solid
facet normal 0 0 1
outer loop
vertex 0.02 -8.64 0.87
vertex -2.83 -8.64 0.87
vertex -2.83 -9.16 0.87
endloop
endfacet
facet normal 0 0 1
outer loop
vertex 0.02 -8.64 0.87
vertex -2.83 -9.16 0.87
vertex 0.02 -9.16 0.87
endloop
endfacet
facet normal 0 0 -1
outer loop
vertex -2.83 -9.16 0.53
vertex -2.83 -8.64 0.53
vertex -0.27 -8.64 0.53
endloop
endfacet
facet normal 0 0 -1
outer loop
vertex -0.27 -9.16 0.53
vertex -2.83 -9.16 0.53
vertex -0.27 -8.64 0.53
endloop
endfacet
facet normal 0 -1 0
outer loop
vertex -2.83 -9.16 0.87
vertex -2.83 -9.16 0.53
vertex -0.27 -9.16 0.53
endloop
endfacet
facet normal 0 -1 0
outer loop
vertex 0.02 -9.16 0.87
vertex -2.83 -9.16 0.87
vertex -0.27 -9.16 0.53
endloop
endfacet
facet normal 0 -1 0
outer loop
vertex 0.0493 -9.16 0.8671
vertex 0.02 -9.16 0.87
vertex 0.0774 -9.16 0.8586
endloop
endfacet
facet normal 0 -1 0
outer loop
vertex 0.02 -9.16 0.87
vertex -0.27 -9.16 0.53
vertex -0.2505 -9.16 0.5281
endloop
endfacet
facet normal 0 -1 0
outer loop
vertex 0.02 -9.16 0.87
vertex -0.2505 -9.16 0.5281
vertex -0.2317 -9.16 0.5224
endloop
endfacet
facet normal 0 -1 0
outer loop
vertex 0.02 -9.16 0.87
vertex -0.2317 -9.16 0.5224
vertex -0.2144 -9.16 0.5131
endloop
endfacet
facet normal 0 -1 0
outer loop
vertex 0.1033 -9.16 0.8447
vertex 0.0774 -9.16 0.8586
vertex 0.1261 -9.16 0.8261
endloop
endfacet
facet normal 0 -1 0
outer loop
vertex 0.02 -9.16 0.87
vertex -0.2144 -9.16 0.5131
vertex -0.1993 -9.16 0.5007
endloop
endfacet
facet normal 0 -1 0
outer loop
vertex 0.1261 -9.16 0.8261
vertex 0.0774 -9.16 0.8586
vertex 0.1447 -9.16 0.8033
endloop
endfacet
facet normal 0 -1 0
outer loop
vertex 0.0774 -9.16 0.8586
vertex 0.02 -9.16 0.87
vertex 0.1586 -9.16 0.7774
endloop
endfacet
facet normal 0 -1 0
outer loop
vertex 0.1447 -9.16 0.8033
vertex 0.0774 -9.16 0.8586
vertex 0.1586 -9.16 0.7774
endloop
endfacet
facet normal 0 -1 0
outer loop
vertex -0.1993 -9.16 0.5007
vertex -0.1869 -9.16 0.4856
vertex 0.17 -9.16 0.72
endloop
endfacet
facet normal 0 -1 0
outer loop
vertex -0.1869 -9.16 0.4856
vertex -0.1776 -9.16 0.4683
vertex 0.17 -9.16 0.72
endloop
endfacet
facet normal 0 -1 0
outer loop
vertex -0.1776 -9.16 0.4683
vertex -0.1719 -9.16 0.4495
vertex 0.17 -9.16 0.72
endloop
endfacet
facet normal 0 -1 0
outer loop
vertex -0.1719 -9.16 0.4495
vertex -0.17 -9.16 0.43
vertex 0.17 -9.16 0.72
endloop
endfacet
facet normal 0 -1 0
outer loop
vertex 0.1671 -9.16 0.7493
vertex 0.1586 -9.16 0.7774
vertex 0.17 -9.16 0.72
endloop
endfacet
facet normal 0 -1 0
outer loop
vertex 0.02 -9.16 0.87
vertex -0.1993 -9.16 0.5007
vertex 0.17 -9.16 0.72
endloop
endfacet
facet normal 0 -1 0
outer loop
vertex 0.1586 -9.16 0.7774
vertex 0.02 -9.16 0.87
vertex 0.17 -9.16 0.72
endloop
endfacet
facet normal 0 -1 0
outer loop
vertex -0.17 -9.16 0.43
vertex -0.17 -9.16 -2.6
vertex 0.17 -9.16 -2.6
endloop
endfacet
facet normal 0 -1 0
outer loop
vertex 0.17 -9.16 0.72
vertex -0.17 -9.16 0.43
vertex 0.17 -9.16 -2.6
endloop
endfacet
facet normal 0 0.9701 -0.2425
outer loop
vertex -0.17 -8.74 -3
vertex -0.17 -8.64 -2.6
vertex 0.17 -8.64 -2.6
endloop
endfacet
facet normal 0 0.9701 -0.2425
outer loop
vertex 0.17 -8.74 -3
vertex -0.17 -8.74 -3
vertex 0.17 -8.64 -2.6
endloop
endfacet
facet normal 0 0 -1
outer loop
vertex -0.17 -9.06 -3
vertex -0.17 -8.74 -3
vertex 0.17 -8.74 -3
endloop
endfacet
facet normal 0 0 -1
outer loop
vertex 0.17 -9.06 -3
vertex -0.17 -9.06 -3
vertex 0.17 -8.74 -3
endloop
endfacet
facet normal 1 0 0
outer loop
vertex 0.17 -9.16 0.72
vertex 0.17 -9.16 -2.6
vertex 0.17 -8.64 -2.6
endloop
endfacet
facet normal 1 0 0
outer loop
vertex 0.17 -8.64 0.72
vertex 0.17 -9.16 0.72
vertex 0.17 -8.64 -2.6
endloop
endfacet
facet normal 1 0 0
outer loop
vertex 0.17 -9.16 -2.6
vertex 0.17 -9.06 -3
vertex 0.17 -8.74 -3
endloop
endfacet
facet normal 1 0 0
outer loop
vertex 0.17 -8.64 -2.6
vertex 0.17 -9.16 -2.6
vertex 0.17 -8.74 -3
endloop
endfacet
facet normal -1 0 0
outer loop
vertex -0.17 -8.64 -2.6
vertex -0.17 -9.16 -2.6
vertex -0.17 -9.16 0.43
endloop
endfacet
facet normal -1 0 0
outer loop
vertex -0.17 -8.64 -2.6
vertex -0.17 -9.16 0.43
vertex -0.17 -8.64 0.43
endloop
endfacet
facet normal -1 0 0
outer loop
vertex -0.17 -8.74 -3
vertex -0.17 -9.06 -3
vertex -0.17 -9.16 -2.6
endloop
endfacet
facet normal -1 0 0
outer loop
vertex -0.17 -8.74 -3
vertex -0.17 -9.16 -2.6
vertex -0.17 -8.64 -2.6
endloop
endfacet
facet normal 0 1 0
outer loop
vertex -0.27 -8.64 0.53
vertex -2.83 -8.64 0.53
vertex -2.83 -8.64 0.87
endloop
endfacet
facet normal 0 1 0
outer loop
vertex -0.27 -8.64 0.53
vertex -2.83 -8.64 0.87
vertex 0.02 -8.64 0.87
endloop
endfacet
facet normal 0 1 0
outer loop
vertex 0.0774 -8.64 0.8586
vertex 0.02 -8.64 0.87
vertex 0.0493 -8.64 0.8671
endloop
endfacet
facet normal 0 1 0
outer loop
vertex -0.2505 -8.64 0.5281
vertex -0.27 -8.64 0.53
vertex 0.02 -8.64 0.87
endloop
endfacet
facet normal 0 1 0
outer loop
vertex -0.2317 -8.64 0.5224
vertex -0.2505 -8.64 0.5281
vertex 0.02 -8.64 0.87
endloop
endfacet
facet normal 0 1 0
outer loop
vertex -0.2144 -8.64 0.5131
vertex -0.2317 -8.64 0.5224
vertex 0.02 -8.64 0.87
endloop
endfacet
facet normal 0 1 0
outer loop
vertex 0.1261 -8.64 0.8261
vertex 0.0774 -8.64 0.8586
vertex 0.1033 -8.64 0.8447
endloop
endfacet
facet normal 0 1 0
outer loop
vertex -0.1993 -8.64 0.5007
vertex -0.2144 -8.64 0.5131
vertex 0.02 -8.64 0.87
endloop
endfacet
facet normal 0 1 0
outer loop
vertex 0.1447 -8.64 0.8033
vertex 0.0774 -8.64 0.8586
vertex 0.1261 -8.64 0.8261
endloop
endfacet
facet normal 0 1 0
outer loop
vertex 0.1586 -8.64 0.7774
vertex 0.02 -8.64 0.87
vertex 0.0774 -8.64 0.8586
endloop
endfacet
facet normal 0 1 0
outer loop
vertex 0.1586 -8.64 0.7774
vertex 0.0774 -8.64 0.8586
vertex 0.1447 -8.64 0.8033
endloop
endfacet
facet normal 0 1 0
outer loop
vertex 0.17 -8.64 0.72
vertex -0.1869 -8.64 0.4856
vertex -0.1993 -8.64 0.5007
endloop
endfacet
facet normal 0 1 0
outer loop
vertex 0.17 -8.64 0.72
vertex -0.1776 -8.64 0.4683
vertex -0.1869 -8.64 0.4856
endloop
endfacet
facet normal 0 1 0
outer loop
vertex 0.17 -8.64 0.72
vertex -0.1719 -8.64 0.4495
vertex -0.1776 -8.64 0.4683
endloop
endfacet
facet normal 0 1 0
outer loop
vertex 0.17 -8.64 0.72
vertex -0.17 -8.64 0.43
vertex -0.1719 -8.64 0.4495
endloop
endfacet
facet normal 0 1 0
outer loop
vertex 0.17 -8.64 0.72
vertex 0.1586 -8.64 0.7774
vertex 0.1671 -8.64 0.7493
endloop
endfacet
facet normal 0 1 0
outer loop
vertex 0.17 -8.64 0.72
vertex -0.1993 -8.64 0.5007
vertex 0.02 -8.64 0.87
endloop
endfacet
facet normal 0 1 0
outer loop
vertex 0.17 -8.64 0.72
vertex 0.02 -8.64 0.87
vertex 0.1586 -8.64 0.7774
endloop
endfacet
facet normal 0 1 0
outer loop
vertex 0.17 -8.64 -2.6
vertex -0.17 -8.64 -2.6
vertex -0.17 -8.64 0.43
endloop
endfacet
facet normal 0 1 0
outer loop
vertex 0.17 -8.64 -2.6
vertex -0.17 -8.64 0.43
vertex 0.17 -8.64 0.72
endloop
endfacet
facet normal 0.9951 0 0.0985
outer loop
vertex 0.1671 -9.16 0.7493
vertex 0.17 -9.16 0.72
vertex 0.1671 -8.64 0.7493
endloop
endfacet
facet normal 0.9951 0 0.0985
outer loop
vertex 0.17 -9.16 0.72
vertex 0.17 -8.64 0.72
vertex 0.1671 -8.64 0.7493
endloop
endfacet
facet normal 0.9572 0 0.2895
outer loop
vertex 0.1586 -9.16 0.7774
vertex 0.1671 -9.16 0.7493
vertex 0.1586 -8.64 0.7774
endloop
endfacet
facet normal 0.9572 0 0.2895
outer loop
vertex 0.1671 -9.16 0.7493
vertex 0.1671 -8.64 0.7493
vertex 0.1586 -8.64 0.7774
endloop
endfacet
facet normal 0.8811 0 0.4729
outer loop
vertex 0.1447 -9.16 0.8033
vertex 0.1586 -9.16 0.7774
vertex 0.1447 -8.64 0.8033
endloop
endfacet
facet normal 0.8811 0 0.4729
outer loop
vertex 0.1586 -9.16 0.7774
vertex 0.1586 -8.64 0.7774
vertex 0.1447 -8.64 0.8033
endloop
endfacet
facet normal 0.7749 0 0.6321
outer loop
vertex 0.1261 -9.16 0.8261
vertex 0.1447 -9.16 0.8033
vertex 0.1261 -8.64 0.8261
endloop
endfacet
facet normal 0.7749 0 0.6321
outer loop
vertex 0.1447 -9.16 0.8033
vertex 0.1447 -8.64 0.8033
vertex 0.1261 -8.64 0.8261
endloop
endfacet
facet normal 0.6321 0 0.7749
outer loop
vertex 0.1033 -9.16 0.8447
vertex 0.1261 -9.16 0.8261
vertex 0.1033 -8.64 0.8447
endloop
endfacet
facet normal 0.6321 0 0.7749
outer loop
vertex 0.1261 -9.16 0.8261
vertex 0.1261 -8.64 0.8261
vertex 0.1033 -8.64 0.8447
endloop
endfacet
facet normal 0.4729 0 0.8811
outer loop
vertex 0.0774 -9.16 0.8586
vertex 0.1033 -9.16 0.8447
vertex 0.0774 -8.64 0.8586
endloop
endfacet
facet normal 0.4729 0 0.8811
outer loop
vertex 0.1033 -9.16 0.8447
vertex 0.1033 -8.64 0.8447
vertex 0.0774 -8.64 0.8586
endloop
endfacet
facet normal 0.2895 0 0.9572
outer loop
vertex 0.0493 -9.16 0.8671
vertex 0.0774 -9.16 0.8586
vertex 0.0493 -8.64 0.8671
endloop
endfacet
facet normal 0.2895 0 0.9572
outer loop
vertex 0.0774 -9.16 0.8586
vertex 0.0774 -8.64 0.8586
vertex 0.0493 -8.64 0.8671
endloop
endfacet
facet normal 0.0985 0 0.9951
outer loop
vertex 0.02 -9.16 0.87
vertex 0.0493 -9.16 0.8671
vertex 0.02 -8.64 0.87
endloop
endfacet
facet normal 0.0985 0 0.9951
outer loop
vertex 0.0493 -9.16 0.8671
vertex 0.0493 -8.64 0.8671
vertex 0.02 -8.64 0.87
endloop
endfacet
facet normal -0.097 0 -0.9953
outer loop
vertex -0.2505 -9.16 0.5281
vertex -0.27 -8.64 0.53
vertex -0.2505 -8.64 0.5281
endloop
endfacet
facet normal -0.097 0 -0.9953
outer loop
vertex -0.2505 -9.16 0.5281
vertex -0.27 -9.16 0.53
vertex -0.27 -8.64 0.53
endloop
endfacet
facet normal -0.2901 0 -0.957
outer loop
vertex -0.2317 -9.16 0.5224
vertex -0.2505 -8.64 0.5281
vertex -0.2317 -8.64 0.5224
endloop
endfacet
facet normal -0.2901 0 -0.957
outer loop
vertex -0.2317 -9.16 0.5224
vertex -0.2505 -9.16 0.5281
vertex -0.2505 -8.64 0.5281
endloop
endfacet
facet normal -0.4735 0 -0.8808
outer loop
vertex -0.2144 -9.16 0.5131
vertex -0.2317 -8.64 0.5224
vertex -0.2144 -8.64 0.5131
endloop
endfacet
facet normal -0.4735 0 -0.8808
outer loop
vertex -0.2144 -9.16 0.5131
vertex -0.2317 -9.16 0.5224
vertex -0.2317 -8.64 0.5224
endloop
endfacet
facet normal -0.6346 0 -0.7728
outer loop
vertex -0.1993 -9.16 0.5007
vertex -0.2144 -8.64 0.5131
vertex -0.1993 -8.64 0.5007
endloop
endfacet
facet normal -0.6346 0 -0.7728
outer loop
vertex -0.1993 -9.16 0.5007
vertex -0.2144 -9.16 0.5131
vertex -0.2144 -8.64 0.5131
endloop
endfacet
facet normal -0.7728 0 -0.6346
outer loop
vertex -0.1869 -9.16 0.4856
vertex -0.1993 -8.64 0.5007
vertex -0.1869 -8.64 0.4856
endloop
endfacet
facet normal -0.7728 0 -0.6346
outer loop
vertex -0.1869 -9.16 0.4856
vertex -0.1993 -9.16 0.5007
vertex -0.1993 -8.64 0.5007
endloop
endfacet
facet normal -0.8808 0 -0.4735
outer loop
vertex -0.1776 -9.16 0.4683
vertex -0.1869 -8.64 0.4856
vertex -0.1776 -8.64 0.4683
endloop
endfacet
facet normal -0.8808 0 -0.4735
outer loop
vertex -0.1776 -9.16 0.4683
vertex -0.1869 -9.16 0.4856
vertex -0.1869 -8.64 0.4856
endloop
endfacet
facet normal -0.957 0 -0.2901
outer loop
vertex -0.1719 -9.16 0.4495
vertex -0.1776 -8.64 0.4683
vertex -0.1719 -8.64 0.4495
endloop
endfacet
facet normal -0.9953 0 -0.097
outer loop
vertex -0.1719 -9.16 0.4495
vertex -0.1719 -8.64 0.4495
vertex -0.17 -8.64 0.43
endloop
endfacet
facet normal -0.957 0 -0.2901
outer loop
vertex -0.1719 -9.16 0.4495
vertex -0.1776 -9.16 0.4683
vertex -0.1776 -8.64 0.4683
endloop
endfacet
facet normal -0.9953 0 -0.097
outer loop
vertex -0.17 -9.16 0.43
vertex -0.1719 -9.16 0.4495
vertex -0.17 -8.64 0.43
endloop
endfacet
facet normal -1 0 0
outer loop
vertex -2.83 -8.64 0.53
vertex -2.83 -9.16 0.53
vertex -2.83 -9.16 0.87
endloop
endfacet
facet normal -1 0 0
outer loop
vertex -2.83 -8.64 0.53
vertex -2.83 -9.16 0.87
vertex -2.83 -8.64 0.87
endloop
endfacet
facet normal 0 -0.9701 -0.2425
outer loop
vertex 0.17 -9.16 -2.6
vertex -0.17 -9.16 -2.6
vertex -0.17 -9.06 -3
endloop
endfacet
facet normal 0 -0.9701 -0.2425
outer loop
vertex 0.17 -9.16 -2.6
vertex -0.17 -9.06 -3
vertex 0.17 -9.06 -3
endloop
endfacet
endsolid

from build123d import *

# Parameters (mm, degrees)
BOX006_W         = 0.34
BOX006_H         = 0.52
BOX006_DEPTH     = 3.87
BOX007_W         = 3
BOX007_H         = 0.52
BOX007_DEPTH     = 0.34
FILLET007_R      = 0.15
FILLET008_R      = 0.1
CHAMFER016_SIZE2 = 0.4
CHAMFER016_SIZE  = 0.1
CHAMFER017_SIZE2 = 0.4
CHAMFER017_SIZE  = 0.1


with BuildPart() as kub006:
    # Box006 → Box006 (new body)
    with BuildSketch(Plane(origin=(-0.17, -0.26, -3), x_dir=(1, 0, 0), z_dir=(0, 0, 1))):
        with Locations((0.17, 0.26)):
            Rectangle(BOX006_W, BOX006_H)
    extrude(amount=BOX006_DEPTH)


with BuildPart() as chamfer017:
    # Box007 → Box007 (new body)
    with BuildSketch(Plane(origin=(-2.83, -0.26, 0.53), x_dir=(1, 0, 0), z_dir=(0, 0, 1))):
        with Locations((1.5, 0.26)):
            Rectangle(BOX007_W, BOX007_H)
    extrude(amount=BOX007_DEPTH)

    # Fusion004: union Kub006
    add(kub006.part)

    # Fillet007
    fillet007_edges = [chamfer017.edges().sort_by_distance(p)[0] for p in [
        (0.17, 0, 0.87),
    ]]
    fillet(fillet007_edges, radius=FILLET007_R)

    # Fillet008
    fillet008_edges = [chamfer017.edges().sort_by_distance(p)[0] for p in [
        (-0.17, 0, 0.53),
    ]]
    fillet(fillet008_edges, radius=FILLET008_R)

    # Chamfer016
    chamfer016_edges = [chamfer017.edges().sort_by_distance(p)[0] for p in [
        (0, 0.26, -3),
    ]]
    chamfer016_side = chamfer017.faces().sort_by_distance((0, 0, -3))[0]
    chamfer(chamfer016_edges, length=CHAMFER016_SIZE, length2=CHAMFER016_SIZE2, reference=chamfer016_side)

    # Chamfer017
    chamfer017_edges = [chamfer017.edges().sort_by_distance(p)[0] for p in [
        (0, -0.26, -3),
    ]]
    chamfer017_side = chamfer017.faces().sort_by_distance((0, -0.05, -3))[0]
    chamfer(chamfer017_edges, length=CHAMFER017_SIZE, length2=CHAMFER017_SIZE2, reference=chamfer017_side)


with BuildPart() as chamfer017_1:
    # Chamfer017 placement: moved
    add(chamfer017.part.moved(Location((0, -8.9, 0))))


solid = chamfer017_1.part
